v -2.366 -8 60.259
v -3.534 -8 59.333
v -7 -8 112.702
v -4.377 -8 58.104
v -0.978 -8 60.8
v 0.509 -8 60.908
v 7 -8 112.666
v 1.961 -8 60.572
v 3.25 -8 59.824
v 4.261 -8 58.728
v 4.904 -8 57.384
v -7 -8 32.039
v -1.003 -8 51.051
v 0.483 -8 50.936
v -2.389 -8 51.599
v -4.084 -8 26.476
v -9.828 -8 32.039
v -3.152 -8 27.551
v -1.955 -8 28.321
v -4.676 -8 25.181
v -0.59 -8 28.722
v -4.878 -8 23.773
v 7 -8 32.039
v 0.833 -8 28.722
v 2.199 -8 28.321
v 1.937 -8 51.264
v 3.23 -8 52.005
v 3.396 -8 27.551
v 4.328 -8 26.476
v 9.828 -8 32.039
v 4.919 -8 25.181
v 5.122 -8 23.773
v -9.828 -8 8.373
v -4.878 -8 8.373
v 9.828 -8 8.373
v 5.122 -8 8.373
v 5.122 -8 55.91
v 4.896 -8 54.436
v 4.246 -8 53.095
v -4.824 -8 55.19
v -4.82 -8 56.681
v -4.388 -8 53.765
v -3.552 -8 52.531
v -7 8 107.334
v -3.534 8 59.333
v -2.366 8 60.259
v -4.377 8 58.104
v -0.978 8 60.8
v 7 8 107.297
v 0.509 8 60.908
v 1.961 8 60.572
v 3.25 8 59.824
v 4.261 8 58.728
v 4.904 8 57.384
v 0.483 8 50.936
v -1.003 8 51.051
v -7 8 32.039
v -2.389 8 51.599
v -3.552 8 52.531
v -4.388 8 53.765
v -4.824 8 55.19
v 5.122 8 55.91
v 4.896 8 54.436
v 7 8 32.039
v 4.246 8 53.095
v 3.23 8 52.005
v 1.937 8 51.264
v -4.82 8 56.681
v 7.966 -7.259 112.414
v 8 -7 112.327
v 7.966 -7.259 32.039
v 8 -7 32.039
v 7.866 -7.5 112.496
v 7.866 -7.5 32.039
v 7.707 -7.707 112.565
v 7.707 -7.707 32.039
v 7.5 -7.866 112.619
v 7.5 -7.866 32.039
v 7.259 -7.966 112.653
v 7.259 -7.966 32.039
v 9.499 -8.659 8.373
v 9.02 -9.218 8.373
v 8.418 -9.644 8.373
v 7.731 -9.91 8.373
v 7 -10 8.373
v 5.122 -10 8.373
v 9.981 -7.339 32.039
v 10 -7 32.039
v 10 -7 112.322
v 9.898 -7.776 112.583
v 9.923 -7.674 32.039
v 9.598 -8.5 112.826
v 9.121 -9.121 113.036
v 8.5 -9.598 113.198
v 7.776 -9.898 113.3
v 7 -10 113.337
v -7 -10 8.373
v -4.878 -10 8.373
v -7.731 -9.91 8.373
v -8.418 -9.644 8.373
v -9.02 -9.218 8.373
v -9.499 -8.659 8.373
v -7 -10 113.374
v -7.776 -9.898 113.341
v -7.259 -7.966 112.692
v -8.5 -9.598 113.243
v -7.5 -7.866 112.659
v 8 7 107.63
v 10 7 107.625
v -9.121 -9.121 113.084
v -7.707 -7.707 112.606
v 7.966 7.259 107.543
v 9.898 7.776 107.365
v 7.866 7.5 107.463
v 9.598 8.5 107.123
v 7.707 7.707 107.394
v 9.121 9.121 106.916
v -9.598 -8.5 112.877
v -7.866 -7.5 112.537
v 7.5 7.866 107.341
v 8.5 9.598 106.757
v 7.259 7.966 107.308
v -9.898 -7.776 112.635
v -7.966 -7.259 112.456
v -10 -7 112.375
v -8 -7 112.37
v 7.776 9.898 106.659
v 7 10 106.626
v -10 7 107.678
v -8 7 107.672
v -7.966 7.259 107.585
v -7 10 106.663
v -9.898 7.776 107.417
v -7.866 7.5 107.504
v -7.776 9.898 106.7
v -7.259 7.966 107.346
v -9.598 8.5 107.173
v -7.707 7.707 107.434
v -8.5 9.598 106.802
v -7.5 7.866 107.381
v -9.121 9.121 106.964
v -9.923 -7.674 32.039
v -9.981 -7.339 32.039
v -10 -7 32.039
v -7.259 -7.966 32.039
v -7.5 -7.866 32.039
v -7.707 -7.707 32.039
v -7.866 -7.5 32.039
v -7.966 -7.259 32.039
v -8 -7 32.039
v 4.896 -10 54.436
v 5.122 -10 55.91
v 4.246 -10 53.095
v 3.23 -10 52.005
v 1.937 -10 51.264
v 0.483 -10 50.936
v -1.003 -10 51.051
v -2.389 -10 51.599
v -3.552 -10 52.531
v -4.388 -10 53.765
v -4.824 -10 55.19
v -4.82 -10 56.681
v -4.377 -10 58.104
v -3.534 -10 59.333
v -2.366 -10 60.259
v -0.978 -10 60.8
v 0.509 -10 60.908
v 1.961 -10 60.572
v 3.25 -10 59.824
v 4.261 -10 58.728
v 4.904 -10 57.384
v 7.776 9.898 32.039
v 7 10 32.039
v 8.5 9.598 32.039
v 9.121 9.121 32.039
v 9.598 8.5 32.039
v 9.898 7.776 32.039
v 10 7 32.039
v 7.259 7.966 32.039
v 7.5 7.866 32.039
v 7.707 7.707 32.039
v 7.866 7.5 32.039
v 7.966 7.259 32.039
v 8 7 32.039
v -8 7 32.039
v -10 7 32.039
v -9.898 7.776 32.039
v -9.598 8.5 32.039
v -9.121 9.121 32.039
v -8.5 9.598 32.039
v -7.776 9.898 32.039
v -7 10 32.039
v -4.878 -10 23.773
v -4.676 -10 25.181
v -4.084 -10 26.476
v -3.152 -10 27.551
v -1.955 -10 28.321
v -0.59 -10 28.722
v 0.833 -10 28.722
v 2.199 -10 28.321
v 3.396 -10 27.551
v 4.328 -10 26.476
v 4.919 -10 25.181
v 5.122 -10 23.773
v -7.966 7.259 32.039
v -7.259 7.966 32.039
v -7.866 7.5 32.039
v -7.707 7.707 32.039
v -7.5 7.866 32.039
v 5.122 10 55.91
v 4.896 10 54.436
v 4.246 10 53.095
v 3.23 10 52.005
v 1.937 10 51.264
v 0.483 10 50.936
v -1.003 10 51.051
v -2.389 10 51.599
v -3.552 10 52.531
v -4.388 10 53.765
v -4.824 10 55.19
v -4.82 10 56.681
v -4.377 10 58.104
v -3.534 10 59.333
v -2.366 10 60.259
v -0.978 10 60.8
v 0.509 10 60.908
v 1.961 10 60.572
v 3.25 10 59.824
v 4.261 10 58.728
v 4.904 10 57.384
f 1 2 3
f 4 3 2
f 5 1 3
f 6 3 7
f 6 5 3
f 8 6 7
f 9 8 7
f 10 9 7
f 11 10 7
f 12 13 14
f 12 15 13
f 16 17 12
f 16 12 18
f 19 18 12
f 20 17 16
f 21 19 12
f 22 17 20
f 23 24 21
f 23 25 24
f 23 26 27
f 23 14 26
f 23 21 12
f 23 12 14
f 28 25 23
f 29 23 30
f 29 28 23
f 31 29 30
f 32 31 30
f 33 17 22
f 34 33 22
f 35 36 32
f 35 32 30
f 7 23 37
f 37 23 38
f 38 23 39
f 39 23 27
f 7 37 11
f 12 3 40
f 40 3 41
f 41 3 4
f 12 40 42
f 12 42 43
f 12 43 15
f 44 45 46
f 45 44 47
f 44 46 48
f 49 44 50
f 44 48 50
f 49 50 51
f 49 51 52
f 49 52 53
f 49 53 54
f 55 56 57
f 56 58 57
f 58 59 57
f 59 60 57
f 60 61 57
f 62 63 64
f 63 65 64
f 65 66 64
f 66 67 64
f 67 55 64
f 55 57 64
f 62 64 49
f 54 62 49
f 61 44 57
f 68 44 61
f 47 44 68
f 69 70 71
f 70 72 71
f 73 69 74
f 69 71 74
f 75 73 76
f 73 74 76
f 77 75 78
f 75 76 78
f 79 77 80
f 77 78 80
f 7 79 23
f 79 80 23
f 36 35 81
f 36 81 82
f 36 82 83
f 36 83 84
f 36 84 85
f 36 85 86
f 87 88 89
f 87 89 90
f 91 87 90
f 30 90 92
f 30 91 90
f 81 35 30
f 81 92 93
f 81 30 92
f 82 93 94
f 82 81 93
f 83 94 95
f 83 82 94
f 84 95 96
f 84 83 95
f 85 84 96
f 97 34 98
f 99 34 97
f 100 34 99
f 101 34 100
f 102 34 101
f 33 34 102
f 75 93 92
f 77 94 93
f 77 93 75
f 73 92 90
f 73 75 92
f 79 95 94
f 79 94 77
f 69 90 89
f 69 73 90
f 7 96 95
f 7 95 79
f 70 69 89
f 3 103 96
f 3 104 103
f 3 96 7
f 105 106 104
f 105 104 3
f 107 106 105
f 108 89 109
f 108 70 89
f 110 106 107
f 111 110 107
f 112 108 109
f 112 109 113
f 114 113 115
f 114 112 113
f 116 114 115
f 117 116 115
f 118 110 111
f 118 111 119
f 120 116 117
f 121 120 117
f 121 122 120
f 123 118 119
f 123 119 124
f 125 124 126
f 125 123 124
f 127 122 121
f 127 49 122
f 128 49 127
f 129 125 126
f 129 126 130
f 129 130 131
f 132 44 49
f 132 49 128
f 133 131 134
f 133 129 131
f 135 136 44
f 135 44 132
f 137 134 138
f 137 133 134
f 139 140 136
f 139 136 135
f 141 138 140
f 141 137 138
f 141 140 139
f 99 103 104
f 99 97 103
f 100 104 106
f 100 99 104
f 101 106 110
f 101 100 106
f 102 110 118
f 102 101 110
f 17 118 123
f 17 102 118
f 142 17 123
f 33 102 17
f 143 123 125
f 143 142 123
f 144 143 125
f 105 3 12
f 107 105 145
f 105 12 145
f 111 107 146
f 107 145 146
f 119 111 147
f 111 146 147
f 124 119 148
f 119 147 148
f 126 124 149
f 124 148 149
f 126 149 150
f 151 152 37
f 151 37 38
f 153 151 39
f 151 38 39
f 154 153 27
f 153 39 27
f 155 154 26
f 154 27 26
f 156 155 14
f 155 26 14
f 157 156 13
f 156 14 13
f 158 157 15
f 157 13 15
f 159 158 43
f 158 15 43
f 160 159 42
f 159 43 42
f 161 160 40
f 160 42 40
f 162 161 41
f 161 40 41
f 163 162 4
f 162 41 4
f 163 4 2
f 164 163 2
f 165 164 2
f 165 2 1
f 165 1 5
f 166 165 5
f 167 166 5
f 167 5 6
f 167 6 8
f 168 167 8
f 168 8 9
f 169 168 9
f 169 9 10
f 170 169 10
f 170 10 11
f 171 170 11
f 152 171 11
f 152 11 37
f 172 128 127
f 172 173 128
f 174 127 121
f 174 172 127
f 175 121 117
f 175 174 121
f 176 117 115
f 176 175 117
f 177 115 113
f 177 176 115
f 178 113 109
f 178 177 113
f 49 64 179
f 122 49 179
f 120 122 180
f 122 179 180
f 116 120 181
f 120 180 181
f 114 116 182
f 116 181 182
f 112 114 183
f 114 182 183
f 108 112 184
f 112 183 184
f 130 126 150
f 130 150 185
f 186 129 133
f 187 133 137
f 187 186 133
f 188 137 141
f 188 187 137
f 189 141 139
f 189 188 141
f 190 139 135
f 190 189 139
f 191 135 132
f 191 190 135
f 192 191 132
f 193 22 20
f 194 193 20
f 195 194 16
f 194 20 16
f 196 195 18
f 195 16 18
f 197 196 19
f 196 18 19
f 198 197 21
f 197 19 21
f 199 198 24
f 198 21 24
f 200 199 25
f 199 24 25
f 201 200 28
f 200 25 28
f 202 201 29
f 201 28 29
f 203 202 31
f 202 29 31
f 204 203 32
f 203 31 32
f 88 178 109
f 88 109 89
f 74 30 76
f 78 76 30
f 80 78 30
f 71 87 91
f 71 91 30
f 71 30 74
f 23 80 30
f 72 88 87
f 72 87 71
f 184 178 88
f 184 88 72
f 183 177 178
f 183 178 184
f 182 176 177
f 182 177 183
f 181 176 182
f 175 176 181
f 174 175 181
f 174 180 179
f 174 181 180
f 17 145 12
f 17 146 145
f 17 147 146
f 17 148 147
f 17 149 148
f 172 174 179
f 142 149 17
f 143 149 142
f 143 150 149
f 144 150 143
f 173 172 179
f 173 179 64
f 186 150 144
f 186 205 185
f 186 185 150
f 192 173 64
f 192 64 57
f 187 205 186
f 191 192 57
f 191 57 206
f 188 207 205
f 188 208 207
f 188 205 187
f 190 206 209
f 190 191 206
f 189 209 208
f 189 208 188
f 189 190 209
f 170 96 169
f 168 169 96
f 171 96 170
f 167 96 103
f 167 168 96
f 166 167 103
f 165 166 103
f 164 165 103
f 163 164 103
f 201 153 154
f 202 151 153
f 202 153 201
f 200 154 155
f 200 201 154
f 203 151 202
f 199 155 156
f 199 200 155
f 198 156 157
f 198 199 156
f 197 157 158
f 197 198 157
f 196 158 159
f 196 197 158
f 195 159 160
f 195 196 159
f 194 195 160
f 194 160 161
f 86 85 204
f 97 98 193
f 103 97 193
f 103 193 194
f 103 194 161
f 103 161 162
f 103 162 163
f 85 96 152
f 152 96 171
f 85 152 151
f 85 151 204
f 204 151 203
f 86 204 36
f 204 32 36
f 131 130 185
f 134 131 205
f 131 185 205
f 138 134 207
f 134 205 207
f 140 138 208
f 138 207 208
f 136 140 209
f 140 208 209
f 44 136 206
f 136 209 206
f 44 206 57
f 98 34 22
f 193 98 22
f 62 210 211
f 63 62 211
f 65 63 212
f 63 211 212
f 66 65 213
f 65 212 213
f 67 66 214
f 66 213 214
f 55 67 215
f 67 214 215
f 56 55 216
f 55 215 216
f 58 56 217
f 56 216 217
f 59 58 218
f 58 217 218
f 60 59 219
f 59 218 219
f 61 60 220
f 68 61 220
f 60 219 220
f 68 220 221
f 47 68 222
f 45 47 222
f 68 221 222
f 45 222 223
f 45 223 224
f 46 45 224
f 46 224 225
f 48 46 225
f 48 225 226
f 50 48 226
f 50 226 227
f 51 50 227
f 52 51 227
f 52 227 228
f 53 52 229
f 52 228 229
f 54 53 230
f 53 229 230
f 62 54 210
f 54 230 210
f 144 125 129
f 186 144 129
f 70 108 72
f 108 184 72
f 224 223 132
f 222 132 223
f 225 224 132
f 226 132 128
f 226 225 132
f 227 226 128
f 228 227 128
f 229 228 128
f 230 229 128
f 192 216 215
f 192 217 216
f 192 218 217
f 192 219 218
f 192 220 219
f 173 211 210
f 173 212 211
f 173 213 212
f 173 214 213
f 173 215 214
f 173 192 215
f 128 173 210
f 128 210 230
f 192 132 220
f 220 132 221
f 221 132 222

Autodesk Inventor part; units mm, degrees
ref_plane "Start Plane" through (0, 0, 0) normal (0, 0, 1) x (1, 0, 0)
ref_plane "End Plane" through (0, 0, 113.3811) normal (0, 0, 1) x (1, 0, 0)
sketch "Sketch" plane through (0, 0, 0) normal (0, 0, 1) x (1, 0, 0)
  line L0 (-10, -7) -> (-10, 7)
  line L1 (-7, 10) -> (7, 10)
  line L2 (10, 7) -> (10, -7)
  line L3 (7, -10) -> (-7, -10)
  arc A0 (-10, -7) -> (-7, -10) centre (-7, -7) ccw
  arc A1 (-7, 10) -> (-10, 7) centre (-7, 7) ccw
  arc A2 (10, 7) -> (7, 10) centre (7, 7) ccw
  arc A3 (7, -10) -> (10, -7) centre (7, -7) ccw
  arc A4 (-7, 8) -> (-8, 7) centre (-7, 7) ccw
  line L4 (-7, 8) -> (7, 8)
  arc A5 (8, 7) -> (7, 8) centre (7, 7) ccw
  line L5 (8, 7) -> (8, -7)
  arc A6 (7, -8) -> (8, -7) centre (7, -7) ccw
  line L6 (7, -8) -> (-7, -8)
  arc A7 (-8, -7) -> (-7, -8) centre (-7, -7) ccw
  line L7 (-8, -7) -> (-8, 7)
  line L8 (0, 14.8698) -> (0, -14.8698) construction
  line L9 (-14.8698, 0) -> (14.8698, 0) construction
  dimension "d7" = 3
  dimension "d10" = 20
  dimension "d11" = 20
  dimension "d12" = 2
  dimension "d15" = 10
  dimension "d16" = 10
extrude "Body" add sketch "Sketch" along normal up to surface (113.3811 mm away) from surface at 0
sketch "Sketch3" plane through (0, 0, 0) normal (0, 0, 1) x (1, 0, 0)
  line L0 (0, 0) -> (10, 0)
ref_plane "Work Plane3" through (0, 0, 0) normal (0, -1, 0) x (1, 0, 0)
sketch "Sketch4" plane through (0, 0, 0) normal (0, -1, 0) x (1, 0, 0)
  line L0 (-2, 0) -> (12, 0)
  line L1 (-2, 113.3811) -> (12, 113.3811)
  dimension "d18" = 113.3811
ref_plane "Work Plane4" through (-0.0781, -10.0538, 113.3733) normal (0.0025, 0.3181, 0.9481) x (1, -0.0004, -0.0025)
split "Split1" plane through (-0.0781, -10.0538, 113.3733) removes the side toward (0.0025, 0.3181, 0.9481)
sketch "Sketch5" plane through (-7, 10, 0) normal (0, 1, 0) x (1, 0, 0)
  circle A0 centre (7.1219, -23.7725) radius 5 projected
  circle A1 centre (7.1219, -23.7725) radius 9 construction
  circle A2 centre (7.1219, -23.7725) radius 7 construction
  line L0 (3.0805, -30.7725) -> (-0.961, -23.7725)
  line L1 (-0.961, -23.7725) -> (3.0805, -16.7725)
  line L2 (3.0805, -16.7725) -> (11.1634, -16.7725)
  line L3 (11.1634, -16.7725) -> (15.2048, -23.7725)
  line L4 (15.2048, -23.7725) -> (11.1634, -30.7725)
  line L5 (11.1634, -30.7725) -> (3.0805, -30.7725)
  line L6 (-3, -112.3746) -> (-3, -107.6775) projected
  line L7 (-3, 0) -> (-3, -107.6775) projected
  line L8 (-3, 0) -> (-3, -112.3746) projected
  line L9 (17, -107.6254) -> (17, -112.3225) projected
  line L10 (17, 0) -> (17, -112.3225) projected
  line L11 (17, 0) -> (17, -107.6254) projected
  line L12 (0, -106.6632) -> (14, -106.6267) projected
  line L13 (17, 0) -> (17, -112.3225) projected
  line L14 (17, -8.3733) -> (-3, -8.3733)
  line L15 (-3, 0) -> (17, 0)
  line L16 (17, -32.0389) -> (-3, -32.0389)
  line L17 (12.1219, -23.7725) -> (12.1219, 0)
  line L18 (0, 0) -> (14, 0) projected
  line L19 (2.1219, 0) -> (2.1219, -24.4296)
  circle A3 centre (7.1219, -55.9225) radius 2.25 projected
  circle A4 centre (7.1219, -55.9225) radius 4.5
  point P0 (7, 0)
  point P1 (7.1219, -30.7725)
  point P2 (0, -33.0389)
  point P3 (-3, -32.0389)
  point P4 (0, -113.3733)
  point P5 (12.7606, -19.5389)
  point P6 (9.7821, -19.5389)
  point P7 (4.4618, -19.5389)
  point P8 (1.4833, -19.5389)
  point P9 (-3, -8.3733)
  point P10 (2.1219, -8.3733)
  point P11 (2.1219, -18.4328)
  point P12 (12.1219, -18.4328)
  point P13 (12.1219, -8.3733)
  point P14 (12.1219, -19.5389)
  point P15 (2.1219, -19.5389)
  dimension "d21" = 14
  dimension "d19" = 18
  dimension "d22" = 1
  dimension "d27" = 9
  dimension "d31" = 105
extrude "Extrusion2" cut sketch "Sketch5" against normal up to surface (18 mm away) contours A0 | L17 L3 L4 L5 L0 L1 L19 A0 | A0 L19 L1 L2 L3 L17 | L17 L14 L10 L16 L7 L19 L1 L0 L5 L4 L3 | L3 L2 L1 L19 L14 L17 | L17 L15 L10 L14 | L14 L19 L15 L17 | L14 L7 L15 L19
sketch "Sketch8" plane through (-7, 10, 106.6632) normal (0, 1, 0) x (1, 0, -0.0026)
  circle A0 centre (7.2542, 50.7219) radius 2.25 projected
  circle A1 centre (7.2542, 50.7219) radius 5
  point P0 (7.278, 106.6446)
  dimension "d28" = 10
extrude "Extrusion4" cut sketch "Sketch8" against normal through all contours A0 | A1
sketch "Sketch9" plane through (-7, 10, 106.6632) normal (0, 1, 0) x (1, 0, 0)
  circle A0 centre (7.1219, 82.8906) radius 5 projected
  line L0 (2.1219, 106.6632) -> (2.1219, 82.2336) projected
  line L1 (12.1219, 82.8906) -> (12.1219, 106.6632) projected
  line L2 (17, 98.2899) -> (-3, 98.2899) projected
  line L3 (-3, 106.6632) -> (-3, -1.0143) projected
  line L4 (17, 106.6632) -> (17, -0.9622) projected
  line L5 (17, 74.6243) -> (-3, 74.6243) projected
  line L6 (17, 106.6632) -> (17, 74.6243)
  line L7 (-3, 74.6243) -> (-3, 106.6632)
  line L8 (17, 98.2899) -> (-3, 98.2899)
  line L9 (17, 106.6632) -> (-3, 106.6632)
  point P0 (2.1219, 82.8906)
  point P1 (2.1219, 98.2899)
  point P2 (12.1219, 98.2899)
extrude "Extrusion5" cut sketch "Sketch9" against normal through all contours A0 | A0 L0 L2 L1 | L2 L0 L9 L1 | L1 L9 L4 L2 | L2 L3 L9 L0
equation "\"d7\" = G_IR"
equation "\"d10\" = G_H"
equation "\"d11\" = G_W"
equation "\"d12\" = G_T"
equation "\"d15\" = 0.5 * d10"
equation "\"d16\" = 0.5 * d11"
equation "\"d3\" = G_L"
equation "\"G_W\" = 20"
equation "\"G_H\" = 20"
equation "\"G_T\" = 2"
equation "\"G_IR\" = 3"
equation "\"G_L\" = d18"
equation "\"G_OFFSET_START\" = 0"
equation "\"G_OFFSET_END\" = 3.38113"
equation "\"d14\" = G_OFFSET_END + B_L"
equation "\"B_L\" = 110"
properties part number "ISO 12633-2 - 20x20x2 - 113,38" material "Steel, Mild"
